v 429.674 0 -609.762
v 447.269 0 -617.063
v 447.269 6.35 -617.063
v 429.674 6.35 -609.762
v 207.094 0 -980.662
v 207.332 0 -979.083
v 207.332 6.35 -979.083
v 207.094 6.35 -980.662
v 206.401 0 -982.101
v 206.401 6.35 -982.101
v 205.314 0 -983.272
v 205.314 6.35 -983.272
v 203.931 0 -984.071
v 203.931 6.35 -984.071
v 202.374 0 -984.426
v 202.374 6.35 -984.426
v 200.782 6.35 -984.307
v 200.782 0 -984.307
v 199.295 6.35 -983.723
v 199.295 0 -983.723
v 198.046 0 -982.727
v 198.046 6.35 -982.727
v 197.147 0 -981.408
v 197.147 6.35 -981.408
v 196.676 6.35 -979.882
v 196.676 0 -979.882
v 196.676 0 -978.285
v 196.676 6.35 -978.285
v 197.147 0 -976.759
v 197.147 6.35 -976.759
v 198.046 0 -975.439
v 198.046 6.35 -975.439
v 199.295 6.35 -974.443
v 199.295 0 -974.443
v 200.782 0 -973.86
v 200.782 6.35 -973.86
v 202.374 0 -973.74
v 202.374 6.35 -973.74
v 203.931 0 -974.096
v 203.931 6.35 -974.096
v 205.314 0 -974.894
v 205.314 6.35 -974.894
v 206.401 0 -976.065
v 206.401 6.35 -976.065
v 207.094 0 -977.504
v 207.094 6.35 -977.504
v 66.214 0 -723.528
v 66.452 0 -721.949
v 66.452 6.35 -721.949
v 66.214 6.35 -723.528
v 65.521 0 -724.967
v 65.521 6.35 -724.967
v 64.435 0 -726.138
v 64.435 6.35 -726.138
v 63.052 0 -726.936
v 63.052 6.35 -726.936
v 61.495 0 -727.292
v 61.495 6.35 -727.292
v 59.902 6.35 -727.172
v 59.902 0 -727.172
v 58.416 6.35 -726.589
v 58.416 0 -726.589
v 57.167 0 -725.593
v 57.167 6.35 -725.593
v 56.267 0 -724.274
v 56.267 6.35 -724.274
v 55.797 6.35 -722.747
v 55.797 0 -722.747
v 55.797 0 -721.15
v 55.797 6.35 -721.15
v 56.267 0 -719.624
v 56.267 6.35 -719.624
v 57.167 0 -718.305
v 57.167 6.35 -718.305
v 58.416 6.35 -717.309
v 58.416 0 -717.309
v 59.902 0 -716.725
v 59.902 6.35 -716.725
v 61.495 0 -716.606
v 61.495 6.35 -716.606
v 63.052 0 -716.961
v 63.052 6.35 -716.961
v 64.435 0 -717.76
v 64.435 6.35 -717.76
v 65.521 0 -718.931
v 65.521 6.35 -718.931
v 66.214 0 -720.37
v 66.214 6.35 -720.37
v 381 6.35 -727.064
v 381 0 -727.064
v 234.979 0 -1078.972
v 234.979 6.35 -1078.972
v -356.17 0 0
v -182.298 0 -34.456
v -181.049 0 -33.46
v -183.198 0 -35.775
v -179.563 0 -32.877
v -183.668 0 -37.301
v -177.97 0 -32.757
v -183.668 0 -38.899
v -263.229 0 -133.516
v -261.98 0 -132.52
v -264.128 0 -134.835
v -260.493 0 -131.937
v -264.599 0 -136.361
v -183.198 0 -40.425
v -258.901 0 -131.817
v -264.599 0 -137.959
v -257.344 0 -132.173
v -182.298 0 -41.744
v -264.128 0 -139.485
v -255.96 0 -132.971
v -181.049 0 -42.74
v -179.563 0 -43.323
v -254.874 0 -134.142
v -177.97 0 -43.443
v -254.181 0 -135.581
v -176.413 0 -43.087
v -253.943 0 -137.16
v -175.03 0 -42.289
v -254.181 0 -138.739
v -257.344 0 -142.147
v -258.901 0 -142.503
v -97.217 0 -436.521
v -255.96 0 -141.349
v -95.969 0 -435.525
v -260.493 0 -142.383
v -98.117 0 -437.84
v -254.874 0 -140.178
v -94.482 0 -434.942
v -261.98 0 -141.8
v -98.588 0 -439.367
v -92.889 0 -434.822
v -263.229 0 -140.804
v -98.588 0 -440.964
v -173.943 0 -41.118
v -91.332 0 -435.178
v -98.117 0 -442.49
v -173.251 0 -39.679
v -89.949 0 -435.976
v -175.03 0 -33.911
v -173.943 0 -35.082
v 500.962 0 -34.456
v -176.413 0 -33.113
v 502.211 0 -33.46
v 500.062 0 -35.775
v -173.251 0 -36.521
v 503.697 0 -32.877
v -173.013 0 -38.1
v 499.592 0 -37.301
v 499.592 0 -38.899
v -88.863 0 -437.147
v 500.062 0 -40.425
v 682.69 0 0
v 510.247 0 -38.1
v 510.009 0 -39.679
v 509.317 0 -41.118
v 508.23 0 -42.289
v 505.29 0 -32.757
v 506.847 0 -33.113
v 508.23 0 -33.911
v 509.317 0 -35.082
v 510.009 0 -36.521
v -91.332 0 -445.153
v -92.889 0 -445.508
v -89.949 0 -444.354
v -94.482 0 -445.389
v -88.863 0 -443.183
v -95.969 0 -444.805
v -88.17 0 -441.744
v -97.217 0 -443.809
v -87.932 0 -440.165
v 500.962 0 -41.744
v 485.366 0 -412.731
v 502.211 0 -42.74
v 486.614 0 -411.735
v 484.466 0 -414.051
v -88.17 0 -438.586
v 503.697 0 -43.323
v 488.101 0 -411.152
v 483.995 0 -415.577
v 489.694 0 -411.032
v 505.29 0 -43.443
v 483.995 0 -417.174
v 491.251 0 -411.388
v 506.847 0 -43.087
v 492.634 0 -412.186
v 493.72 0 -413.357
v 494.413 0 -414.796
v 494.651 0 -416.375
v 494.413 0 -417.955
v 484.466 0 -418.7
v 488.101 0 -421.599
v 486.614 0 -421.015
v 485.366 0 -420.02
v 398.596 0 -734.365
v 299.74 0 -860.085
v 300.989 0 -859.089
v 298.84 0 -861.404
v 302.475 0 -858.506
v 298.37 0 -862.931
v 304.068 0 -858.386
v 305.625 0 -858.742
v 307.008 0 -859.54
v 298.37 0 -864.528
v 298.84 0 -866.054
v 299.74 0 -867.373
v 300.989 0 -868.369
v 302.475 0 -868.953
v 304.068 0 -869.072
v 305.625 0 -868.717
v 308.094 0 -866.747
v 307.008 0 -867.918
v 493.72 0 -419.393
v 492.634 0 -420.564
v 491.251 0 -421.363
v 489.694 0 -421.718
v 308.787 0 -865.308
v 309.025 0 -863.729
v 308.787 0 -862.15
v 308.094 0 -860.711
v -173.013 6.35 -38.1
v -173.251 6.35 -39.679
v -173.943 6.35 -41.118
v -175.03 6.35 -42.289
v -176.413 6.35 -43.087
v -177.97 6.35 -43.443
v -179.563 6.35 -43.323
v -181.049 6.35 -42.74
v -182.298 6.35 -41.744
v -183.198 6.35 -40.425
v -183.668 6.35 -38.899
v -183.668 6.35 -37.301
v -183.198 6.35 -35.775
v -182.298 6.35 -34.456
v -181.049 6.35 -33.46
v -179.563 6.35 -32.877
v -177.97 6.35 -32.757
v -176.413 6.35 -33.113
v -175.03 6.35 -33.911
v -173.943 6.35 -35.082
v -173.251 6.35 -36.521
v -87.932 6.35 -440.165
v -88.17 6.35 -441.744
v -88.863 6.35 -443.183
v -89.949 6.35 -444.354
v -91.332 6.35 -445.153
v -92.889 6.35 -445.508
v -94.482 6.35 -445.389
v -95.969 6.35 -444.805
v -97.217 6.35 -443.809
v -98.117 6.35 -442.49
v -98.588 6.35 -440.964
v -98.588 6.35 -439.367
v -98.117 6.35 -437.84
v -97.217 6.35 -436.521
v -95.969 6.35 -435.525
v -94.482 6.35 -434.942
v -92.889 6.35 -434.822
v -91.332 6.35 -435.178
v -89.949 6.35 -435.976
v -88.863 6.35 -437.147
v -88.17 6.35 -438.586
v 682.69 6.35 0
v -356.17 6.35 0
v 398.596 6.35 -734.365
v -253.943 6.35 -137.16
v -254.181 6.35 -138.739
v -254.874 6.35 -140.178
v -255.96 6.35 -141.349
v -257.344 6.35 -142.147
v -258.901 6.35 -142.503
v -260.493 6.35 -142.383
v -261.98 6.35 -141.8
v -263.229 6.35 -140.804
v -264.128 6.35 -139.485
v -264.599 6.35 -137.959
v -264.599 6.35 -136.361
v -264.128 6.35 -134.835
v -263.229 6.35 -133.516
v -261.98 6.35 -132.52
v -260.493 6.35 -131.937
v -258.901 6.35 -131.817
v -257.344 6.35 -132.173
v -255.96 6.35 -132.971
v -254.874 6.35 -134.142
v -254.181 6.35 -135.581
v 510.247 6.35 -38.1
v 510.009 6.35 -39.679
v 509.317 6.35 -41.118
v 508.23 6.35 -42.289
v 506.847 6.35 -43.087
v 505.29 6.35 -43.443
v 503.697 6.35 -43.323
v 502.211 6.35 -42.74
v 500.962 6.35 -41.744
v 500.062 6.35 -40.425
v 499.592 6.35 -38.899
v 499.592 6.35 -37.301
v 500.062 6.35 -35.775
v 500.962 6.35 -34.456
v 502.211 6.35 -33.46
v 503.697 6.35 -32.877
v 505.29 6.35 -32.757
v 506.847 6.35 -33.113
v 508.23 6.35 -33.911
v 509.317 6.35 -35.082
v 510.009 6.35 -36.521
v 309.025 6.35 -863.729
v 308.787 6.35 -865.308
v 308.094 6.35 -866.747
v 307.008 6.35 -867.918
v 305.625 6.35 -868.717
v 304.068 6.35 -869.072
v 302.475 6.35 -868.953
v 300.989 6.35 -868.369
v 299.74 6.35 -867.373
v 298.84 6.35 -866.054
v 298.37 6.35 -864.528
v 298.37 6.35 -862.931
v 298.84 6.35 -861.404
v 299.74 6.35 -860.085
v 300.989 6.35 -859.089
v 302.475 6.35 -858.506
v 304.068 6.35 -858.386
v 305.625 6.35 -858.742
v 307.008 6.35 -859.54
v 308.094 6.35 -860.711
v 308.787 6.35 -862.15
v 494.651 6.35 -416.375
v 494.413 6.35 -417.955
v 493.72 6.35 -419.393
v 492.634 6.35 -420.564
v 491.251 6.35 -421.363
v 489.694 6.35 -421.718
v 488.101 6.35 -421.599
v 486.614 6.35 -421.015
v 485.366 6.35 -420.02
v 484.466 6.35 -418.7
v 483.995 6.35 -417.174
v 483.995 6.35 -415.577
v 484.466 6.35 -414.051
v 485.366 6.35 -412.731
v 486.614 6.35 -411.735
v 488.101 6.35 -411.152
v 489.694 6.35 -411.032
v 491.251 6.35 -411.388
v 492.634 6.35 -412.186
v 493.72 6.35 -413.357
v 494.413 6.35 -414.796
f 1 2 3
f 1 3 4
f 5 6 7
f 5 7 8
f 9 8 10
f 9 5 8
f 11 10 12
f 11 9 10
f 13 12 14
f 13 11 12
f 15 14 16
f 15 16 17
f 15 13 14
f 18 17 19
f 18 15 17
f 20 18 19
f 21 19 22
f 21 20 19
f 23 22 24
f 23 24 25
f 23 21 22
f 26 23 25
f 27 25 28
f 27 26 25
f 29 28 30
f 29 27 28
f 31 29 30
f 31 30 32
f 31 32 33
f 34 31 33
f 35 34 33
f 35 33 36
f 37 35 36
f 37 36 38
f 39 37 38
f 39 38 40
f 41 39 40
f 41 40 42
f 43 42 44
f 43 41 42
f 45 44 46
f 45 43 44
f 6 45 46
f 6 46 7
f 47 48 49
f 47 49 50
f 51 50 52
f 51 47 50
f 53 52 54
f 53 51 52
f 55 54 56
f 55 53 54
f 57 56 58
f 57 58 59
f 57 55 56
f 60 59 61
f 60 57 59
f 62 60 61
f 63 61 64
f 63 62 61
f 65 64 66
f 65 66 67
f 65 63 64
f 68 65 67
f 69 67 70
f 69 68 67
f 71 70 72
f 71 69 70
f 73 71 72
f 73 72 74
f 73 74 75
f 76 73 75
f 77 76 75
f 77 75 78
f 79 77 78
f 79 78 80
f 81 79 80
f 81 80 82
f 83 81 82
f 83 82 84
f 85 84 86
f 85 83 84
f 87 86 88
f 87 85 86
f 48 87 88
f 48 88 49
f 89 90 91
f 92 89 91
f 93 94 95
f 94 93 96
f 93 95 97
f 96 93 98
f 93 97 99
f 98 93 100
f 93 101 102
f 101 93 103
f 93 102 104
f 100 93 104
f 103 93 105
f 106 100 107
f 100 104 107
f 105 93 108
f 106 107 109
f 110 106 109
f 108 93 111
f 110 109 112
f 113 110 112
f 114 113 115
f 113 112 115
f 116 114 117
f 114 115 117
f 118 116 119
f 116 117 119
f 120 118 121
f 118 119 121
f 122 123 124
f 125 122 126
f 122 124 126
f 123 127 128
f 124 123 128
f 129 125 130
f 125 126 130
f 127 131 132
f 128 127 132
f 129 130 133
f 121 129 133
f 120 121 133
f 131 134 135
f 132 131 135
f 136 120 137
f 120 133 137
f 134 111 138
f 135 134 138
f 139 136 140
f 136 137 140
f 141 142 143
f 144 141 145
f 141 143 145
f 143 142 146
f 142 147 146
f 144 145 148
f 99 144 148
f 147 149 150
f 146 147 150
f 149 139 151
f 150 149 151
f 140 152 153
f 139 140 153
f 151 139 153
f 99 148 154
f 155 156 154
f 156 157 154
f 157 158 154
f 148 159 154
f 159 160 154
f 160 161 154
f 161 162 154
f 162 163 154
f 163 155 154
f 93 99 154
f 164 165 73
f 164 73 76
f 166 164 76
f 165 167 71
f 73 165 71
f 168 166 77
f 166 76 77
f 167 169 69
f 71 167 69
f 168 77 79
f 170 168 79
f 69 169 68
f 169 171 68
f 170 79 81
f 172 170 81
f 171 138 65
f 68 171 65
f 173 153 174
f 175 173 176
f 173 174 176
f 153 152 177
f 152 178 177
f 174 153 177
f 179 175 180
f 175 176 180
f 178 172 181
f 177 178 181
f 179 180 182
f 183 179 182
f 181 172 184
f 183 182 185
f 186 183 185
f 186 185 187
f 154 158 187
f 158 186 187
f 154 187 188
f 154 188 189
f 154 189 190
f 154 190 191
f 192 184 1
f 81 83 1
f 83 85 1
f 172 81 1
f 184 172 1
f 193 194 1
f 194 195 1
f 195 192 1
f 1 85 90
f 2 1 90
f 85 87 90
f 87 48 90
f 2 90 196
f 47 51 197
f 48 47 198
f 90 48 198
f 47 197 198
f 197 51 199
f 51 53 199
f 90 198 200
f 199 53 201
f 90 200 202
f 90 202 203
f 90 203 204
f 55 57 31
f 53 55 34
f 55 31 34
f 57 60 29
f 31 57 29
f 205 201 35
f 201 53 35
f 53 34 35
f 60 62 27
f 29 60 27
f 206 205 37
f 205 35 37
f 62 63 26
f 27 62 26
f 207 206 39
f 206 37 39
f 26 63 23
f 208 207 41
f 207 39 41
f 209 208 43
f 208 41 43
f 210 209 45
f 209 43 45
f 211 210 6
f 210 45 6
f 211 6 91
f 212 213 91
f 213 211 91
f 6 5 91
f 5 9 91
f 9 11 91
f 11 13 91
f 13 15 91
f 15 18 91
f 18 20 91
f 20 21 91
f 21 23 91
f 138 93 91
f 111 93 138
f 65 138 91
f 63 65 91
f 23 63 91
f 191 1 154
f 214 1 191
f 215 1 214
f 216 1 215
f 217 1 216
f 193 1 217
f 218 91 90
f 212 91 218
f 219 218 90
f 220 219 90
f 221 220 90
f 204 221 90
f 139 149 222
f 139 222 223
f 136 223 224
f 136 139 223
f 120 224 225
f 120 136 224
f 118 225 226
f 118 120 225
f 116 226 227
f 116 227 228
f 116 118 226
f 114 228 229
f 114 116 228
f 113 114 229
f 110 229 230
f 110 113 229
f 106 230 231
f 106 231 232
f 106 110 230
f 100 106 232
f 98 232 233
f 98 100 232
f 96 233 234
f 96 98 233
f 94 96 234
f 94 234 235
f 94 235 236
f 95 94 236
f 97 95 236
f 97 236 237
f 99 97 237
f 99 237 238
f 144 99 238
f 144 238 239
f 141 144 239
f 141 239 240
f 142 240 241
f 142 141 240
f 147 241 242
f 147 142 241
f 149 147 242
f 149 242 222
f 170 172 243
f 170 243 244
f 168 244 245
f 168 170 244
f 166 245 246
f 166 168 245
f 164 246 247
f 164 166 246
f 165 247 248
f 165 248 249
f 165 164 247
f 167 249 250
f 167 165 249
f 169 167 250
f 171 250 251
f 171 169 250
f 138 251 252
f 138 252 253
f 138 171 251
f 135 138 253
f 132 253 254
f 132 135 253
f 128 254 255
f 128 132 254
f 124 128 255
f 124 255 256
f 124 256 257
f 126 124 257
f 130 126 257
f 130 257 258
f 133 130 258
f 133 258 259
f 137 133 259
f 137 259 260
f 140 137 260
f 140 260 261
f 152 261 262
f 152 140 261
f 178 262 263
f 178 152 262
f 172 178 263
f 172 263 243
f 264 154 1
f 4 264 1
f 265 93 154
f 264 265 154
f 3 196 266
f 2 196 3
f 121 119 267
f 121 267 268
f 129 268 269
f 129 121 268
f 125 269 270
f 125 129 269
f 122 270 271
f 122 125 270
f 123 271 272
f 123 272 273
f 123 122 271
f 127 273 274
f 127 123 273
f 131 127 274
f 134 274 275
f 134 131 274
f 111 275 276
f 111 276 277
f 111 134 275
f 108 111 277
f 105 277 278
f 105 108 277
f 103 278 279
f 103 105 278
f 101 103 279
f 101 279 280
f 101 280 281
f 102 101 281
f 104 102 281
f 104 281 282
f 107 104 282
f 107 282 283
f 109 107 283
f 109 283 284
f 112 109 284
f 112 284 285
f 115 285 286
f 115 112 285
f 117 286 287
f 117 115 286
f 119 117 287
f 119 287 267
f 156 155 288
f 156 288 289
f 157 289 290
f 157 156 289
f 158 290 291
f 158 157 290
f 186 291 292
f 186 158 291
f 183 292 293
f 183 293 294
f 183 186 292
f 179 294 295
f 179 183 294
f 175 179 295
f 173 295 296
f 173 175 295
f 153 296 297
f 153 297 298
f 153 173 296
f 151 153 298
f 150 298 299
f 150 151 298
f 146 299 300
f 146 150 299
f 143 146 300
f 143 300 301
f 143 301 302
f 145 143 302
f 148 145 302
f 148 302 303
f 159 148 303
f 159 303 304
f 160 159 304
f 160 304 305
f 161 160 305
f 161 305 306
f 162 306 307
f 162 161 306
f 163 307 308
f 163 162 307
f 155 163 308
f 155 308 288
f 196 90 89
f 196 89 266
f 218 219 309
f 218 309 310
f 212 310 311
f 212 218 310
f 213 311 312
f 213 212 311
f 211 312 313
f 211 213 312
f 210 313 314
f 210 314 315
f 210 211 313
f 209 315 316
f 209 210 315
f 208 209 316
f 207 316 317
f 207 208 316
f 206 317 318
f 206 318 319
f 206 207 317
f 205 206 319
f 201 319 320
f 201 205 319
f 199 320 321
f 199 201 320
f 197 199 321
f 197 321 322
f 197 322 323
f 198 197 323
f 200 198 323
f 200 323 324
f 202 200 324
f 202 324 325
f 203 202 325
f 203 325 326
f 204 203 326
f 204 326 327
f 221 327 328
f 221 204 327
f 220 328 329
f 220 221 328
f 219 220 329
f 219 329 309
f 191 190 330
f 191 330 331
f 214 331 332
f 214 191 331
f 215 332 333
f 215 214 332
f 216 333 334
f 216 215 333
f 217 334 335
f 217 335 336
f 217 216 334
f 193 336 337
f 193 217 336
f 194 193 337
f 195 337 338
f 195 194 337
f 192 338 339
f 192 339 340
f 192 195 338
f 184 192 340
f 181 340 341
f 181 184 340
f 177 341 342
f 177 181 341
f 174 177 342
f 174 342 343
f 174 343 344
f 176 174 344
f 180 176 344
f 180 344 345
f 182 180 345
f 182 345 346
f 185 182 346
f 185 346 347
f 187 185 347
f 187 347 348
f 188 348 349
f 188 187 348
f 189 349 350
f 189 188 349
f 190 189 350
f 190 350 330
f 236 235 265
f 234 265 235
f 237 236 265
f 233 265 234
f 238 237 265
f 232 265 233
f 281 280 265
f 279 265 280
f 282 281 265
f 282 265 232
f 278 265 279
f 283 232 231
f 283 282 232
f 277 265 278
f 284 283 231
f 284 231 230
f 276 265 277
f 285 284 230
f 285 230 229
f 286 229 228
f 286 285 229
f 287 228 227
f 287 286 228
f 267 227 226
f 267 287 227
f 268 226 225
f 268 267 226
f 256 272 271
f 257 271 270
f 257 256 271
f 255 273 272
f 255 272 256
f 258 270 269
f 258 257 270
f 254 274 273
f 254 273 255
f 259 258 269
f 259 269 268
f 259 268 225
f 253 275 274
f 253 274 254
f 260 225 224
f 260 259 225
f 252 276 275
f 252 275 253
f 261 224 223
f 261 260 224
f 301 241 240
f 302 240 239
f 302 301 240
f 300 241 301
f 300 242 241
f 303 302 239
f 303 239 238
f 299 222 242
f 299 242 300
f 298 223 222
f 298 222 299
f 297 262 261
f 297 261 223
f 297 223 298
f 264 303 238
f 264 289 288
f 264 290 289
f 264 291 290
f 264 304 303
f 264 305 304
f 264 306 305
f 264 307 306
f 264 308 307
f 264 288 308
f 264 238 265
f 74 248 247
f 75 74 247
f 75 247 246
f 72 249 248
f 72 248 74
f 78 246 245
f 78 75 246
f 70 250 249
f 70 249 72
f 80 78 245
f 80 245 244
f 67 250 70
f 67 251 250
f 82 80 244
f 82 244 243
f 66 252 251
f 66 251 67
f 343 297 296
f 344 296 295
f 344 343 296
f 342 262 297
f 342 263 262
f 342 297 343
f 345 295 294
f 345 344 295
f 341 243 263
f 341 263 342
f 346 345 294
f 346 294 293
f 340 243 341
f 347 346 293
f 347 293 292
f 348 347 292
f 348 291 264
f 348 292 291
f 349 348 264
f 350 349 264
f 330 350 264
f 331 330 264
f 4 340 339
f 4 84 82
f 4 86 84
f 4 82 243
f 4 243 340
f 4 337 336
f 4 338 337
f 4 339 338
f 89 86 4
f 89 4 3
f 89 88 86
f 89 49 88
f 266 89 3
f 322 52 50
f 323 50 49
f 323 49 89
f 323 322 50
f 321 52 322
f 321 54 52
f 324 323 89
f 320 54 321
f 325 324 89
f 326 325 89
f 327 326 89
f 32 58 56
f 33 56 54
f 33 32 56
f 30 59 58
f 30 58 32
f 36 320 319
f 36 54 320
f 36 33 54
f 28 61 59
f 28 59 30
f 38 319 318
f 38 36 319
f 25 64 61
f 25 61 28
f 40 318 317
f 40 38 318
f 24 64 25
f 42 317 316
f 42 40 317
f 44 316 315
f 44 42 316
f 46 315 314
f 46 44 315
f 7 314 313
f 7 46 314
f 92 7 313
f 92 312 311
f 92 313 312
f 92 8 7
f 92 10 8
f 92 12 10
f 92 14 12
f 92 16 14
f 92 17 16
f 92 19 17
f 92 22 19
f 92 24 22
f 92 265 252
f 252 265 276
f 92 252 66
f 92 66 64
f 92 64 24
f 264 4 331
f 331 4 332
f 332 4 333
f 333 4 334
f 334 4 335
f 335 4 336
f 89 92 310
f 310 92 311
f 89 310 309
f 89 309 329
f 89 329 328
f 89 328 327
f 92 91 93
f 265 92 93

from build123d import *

# Parameters (mm, degrees)
SKETCH4_R           = 5.3578125
BOSS_EXTRUDE2_DEPTH = 6.35


with BuildPart() as part:
    # Sketch4 → Boss-Extrude2 (new body)
    with BuildSketch(Plane(origin=(0, 0, 0), x_dir=(1, 0, 0), z_dir=(0, 1, 0))):
        Polygon((234.979236566, 1078.971634327), (-356.170330123, 0), (682.689669877, 0), (429.674039163, 609.761730508), (381.000338514, 727.064206463), align=None)
        with Locations((-178.370330123, 38.1)):
            Circle(SKETCH4_R, mode=Mode.SUBTRACT)
        with Locations((-259.300975608, 137.16)):
            Circle(SKETCH4_R, mode=Mode.SUBTRACT)
        with Locations((-93.289784566, 440.165155055)):
            Circle(SKETCH4_R, mode=Mode.SUBTRACT)
        with Locations((504.889669877, 38.1)):
            Circle(SKETCH4_R, mode=Mode.SUBTRACT)
        with Locations((489.29326545, 416.375307605)):
            Circle(SKETCH4_R, mode=Mode.SUBTRACT)
        with Locations((61.094542054, 721.948850069)):
            Circle(SKETCH4_R, mode=Mode.SUBTRACT)
        with Locations((303.667495105, 863.729056592)):
            Circle(SKETCH4_R, mode=Mode.SUBTRACT)
        with Locations((201.97392089, 979.083189991)):
            Circle(SKETCH4_R, mode=Mode.SUBTRACT)
        Polygon((429.674039163, 609.761730508), (381.000338514, 727.064206463), (398.595709907, 734.36526156), (447.269410556, 617.062785606), align=None)
    extrude(amount=BOSS_EXTRUDE2_DEPTH)


solid = part.part
